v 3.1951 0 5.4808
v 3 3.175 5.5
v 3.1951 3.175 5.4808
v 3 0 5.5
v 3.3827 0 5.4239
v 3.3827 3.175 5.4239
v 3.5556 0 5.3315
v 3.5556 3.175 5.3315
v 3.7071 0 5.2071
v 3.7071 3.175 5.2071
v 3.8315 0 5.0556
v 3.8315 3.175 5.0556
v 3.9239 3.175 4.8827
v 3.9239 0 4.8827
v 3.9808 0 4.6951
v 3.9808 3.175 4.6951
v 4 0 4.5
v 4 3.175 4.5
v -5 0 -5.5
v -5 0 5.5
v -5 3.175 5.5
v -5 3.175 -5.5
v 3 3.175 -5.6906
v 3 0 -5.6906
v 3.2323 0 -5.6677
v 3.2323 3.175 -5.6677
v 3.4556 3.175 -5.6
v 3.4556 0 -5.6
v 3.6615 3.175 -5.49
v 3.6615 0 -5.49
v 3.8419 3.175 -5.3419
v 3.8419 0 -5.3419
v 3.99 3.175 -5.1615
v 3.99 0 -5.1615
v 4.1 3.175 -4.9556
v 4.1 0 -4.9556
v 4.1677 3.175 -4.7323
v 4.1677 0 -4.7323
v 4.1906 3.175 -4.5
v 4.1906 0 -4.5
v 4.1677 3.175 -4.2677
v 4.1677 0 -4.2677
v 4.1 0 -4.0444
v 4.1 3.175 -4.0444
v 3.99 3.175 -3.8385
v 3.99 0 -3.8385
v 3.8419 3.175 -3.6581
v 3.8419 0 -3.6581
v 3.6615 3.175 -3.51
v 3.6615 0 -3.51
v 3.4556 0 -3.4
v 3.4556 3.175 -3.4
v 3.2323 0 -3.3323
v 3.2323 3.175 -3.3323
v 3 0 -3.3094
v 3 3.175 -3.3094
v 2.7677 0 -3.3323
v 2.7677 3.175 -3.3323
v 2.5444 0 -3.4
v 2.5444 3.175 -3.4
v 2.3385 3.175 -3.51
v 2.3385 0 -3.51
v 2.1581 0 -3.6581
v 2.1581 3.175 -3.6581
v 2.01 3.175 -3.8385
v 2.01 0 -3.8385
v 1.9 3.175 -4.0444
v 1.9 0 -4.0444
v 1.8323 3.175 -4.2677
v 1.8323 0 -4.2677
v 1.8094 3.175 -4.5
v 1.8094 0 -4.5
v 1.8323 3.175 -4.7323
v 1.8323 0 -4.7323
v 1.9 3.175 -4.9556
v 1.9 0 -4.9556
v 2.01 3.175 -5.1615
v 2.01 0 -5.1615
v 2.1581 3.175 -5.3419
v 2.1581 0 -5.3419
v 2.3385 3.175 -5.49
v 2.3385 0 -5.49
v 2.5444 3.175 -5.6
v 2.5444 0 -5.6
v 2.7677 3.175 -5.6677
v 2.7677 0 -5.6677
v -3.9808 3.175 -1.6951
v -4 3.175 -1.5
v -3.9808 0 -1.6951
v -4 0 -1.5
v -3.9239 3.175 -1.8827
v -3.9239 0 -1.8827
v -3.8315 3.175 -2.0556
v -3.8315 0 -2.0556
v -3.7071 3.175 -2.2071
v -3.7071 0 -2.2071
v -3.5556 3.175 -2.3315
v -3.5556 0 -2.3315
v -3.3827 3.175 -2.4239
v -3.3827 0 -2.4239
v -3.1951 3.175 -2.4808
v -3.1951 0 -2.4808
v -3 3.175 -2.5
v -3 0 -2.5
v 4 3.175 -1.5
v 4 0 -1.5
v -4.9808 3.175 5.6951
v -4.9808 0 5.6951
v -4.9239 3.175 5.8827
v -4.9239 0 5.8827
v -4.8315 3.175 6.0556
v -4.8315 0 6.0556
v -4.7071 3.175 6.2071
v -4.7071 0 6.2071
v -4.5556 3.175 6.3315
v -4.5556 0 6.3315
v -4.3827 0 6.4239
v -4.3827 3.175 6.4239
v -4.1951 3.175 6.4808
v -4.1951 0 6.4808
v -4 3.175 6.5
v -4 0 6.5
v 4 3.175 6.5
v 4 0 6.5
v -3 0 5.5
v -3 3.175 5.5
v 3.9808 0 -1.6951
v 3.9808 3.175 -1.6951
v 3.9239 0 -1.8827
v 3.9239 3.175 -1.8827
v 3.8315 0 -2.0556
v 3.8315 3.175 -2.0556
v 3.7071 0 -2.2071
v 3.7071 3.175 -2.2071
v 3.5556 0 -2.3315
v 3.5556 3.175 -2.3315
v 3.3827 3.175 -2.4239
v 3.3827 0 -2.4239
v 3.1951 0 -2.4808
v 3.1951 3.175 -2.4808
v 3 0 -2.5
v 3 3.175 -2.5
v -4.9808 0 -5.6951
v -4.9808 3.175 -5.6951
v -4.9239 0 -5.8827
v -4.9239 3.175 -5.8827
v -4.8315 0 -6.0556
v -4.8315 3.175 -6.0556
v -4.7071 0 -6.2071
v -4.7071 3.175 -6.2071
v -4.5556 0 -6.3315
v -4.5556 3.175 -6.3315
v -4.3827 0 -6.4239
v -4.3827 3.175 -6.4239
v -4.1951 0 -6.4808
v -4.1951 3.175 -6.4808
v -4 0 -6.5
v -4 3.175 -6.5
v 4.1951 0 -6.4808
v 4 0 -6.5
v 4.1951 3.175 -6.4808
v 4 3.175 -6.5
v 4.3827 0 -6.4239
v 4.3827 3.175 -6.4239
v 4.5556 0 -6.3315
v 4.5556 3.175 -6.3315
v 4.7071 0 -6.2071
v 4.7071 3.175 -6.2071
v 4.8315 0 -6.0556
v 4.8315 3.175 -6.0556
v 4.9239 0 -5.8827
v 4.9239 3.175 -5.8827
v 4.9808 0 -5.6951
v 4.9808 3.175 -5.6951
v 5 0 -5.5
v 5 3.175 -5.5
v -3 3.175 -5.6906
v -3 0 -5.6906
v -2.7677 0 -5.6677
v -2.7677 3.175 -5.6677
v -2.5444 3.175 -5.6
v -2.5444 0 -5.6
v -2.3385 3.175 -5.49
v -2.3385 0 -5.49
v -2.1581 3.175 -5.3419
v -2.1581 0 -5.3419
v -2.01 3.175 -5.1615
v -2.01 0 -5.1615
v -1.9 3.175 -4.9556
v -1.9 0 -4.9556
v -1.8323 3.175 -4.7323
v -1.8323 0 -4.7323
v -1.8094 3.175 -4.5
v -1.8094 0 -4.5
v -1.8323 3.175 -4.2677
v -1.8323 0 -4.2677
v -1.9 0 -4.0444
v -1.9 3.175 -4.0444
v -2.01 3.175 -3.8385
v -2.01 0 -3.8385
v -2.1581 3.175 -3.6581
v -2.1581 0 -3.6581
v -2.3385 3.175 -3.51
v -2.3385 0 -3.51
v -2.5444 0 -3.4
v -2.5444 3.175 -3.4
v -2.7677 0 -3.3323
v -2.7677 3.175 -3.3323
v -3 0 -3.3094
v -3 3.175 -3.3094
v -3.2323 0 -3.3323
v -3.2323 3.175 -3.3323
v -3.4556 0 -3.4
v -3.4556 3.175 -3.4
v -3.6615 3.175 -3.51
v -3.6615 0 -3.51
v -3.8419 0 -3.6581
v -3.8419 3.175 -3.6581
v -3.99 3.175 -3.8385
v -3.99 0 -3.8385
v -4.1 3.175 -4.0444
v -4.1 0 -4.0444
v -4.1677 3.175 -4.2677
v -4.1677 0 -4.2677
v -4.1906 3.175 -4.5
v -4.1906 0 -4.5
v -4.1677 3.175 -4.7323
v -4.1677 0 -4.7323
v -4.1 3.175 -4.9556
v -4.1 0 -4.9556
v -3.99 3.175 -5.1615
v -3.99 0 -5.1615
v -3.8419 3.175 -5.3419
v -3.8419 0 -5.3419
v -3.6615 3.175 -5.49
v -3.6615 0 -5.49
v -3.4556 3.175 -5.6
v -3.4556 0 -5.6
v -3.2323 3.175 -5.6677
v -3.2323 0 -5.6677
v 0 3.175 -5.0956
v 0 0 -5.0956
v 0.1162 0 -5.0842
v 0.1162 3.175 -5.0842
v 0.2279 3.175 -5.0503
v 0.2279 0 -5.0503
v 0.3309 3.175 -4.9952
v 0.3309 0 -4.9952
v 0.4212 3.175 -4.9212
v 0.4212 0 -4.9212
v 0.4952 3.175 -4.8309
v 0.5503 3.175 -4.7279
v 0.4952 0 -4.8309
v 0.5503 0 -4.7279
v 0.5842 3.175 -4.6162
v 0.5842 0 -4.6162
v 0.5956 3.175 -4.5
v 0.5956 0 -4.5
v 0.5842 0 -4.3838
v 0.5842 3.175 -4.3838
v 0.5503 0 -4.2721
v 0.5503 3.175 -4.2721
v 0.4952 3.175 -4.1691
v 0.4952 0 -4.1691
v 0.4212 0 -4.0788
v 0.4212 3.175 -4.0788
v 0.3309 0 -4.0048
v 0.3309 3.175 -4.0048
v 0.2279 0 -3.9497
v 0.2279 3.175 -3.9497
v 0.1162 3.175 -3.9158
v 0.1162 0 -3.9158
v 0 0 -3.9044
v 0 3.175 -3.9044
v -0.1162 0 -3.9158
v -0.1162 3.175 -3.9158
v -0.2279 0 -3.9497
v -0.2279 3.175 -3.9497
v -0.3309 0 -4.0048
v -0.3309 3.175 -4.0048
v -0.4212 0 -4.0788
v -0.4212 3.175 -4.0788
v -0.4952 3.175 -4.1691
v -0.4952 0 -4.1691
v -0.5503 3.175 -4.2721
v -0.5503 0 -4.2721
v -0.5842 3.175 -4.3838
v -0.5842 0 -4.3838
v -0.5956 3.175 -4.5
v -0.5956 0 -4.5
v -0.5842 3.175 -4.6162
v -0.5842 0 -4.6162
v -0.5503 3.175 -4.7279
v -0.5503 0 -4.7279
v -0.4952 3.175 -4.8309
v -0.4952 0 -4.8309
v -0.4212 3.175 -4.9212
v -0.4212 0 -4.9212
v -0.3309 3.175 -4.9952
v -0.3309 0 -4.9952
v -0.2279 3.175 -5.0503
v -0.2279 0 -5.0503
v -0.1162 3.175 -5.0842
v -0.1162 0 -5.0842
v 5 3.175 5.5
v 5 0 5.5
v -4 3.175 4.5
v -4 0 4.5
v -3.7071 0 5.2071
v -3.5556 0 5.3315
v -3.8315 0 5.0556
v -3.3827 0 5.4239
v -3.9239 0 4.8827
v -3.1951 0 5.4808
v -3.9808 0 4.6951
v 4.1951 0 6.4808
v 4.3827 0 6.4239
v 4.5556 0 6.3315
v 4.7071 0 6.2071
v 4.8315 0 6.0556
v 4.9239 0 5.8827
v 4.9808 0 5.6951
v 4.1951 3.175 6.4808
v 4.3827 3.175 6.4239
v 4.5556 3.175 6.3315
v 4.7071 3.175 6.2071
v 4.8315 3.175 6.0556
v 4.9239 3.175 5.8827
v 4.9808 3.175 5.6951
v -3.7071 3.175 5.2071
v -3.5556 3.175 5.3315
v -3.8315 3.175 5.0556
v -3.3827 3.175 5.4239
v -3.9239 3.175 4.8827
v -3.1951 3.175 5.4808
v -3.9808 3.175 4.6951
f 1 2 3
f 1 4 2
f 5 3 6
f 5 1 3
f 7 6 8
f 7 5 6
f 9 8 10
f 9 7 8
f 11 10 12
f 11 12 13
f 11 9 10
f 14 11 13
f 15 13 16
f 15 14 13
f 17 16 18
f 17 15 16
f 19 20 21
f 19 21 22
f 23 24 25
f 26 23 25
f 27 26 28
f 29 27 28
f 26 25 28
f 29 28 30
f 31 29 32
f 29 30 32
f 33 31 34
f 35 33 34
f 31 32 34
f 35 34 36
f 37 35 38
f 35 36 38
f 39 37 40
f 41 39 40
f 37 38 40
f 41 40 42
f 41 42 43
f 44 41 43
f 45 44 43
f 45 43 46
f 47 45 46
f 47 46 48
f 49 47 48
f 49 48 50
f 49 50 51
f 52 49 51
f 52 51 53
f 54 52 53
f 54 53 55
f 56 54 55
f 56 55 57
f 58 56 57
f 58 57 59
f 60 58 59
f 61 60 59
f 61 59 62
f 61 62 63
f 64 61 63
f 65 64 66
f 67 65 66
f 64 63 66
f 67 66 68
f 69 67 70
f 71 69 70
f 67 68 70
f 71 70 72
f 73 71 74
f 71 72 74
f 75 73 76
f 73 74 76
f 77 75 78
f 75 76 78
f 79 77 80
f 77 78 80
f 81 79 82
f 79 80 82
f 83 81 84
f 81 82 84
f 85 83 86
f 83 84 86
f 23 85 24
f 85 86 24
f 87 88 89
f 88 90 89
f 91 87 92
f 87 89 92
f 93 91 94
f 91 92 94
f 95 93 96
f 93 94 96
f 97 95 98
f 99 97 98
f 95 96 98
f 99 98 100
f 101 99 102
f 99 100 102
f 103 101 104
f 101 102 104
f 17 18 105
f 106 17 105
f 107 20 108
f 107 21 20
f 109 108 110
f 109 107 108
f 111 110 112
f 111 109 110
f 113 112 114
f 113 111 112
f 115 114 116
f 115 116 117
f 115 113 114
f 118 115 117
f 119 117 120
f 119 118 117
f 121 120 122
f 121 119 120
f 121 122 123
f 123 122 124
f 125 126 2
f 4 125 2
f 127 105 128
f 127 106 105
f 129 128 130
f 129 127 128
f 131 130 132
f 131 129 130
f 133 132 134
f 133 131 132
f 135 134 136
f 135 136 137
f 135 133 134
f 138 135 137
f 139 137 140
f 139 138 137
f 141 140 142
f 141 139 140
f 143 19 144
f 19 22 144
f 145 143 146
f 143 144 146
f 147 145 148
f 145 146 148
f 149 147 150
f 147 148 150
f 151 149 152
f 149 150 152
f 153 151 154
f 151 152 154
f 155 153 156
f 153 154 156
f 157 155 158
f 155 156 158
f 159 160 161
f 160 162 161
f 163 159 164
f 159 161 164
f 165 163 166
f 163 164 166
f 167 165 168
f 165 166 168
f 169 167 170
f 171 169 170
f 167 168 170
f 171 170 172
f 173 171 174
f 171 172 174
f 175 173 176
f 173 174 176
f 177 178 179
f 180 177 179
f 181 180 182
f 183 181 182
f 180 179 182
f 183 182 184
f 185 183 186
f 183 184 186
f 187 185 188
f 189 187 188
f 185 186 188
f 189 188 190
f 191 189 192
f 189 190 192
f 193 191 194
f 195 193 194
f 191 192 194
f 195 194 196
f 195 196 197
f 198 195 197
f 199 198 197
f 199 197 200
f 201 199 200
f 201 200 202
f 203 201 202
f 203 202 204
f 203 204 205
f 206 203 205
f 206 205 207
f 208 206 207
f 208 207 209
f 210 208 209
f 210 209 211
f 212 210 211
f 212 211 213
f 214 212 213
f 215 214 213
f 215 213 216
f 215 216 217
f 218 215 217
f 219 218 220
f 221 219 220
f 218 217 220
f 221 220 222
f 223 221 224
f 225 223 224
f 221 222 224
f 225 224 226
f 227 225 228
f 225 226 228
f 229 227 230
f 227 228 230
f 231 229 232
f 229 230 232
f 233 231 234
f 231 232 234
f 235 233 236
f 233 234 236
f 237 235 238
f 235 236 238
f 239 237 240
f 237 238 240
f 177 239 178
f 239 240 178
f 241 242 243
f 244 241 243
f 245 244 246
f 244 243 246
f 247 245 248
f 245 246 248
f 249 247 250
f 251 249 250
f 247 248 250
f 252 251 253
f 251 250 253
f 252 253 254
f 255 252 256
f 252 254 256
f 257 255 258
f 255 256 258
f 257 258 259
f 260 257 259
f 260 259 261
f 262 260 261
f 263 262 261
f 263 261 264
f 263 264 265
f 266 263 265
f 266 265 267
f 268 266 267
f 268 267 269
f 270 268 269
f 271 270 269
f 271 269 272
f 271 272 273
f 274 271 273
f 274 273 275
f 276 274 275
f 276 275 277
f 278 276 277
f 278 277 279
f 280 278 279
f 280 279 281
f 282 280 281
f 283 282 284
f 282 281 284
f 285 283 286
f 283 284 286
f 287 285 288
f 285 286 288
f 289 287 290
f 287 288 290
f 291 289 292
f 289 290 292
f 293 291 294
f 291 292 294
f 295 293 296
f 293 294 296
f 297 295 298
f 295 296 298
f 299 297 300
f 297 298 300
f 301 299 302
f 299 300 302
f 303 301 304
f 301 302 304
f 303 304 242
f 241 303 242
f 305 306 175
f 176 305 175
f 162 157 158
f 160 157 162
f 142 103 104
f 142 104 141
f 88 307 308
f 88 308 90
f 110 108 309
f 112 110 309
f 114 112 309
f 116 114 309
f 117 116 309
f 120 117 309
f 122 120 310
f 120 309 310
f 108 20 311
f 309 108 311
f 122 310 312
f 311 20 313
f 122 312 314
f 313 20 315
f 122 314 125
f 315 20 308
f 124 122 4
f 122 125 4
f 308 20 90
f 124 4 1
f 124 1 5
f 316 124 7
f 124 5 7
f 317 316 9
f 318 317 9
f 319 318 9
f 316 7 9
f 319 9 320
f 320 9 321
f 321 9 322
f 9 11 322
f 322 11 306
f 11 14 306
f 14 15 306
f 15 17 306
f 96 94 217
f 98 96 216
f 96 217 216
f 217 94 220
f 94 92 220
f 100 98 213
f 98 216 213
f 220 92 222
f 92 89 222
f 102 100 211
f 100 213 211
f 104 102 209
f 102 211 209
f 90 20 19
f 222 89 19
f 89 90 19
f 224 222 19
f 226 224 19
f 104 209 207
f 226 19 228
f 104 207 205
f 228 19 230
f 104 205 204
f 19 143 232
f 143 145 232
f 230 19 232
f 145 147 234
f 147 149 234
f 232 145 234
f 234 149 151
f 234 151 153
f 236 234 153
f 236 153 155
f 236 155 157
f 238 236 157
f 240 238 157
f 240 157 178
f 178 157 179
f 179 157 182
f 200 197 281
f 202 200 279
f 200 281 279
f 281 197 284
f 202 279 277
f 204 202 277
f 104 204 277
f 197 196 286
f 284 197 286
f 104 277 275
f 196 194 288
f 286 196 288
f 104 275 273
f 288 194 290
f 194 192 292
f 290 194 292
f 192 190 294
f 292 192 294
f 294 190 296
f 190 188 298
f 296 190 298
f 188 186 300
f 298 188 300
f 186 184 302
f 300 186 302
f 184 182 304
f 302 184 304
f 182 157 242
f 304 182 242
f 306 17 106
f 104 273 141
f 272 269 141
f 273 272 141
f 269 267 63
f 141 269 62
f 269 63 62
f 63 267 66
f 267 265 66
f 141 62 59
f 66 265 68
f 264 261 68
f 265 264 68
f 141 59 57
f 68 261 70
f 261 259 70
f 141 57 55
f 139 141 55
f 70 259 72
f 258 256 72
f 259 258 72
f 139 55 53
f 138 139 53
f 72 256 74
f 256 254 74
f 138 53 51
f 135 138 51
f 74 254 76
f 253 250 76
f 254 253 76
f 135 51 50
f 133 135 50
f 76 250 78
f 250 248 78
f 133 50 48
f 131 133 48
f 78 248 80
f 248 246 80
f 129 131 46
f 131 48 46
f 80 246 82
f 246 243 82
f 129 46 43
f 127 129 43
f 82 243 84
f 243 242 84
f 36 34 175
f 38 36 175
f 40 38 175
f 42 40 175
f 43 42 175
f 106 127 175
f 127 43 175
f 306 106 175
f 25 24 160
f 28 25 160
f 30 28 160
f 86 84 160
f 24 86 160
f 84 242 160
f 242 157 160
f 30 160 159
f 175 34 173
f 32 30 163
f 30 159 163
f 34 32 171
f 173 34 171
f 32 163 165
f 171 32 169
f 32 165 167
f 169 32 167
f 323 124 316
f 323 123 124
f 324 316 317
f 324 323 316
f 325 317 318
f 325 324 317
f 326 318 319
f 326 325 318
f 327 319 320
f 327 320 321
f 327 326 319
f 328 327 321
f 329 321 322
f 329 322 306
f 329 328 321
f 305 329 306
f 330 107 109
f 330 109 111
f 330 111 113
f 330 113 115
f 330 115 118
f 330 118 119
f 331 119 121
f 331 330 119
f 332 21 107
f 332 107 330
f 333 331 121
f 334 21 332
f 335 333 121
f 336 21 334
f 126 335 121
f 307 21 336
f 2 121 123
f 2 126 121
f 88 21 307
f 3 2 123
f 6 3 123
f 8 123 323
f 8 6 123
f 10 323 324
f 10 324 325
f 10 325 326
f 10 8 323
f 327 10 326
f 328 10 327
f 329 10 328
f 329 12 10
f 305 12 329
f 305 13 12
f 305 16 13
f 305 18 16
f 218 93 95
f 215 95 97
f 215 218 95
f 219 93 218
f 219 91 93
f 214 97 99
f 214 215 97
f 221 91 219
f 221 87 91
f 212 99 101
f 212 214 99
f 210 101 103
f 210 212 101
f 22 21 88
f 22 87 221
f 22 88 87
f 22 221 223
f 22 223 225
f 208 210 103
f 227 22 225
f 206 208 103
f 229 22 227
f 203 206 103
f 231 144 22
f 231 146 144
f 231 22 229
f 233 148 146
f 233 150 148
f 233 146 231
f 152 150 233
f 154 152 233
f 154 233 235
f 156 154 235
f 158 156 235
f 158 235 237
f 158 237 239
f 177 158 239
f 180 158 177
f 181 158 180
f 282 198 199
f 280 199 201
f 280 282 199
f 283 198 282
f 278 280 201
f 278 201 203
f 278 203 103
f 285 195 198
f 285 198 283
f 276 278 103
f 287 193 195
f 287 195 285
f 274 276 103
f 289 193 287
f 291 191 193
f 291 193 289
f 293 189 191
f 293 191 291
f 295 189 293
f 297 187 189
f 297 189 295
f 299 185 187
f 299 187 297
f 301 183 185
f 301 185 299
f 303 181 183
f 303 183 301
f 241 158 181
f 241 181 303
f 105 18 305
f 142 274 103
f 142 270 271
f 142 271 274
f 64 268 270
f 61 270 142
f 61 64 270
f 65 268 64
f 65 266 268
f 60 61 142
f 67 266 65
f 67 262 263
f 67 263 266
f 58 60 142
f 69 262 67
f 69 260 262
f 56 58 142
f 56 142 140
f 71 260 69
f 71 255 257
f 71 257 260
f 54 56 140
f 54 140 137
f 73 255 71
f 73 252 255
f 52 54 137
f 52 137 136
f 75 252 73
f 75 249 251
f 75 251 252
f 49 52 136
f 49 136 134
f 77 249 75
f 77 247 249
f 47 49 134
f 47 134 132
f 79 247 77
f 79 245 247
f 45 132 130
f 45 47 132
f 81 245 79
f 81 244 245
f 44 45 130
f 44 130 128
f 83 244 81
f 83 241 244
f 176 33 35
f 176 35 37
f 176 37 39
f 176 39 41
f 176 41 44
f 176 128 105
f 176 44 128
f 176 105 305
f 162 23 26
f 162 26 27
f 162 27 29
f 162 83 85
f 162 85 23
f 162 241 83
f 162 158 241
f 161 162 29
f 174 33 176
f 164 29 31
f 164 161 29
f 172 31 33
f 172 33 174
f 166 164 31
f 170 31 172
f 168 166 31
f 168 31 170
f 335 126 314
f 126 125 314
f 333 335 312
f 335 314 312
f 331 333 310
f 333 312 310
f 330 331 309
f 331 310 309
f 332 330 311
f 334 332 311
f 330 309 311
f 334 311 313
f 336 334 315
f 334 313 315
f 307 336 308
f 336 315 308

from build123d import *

# Parameters (mm, degrees)
SKETCH1_W                           = 10
SKETCH1_H                           = 13
EXTRUDE1_DEPTH                      = 3.175
SKETCH2_W                           = 8
SKETCH2_H                           = 8
EXTRUDE2_DEPTH                      = 3.5
F_0_80_TAPPED_HOLE1_D               = 1.19126
F_0_80_TAPPED_HOLE1_DEPTH           = 4
F_0_80_TAPPED_HOLE1_TIP             = 0.357890611
F_3_32_0_09375_DIAMETER_HOLE1_D     = 2.38125
F_3_32_0_09375_DIAMETER_HOLE1_DEPTH = 10
F_3_32_0_09375_DIAMETER_HOLE1_TIP   = 0.715399675
FILLET7_R                           = 1


with BuildPart() as part:
    # Sketch1 → Extrude1 (new body)
    with BuildSketch(Plane(origin=(0, 0, 0), x_dir=(1, 0, 0), z_dir=(0, 1, 0))):
        Rectangle(SKETCH1_W, SKETCH1_H)
    extrude(amount=EXTRUDE1_DEPTH)

    # Sketch2 → Extrude2 (cut)
    with BuildSketch(Plane(origin=(0, 3.175, 0), x_dir=(1, 0, 0), z_dir=(0, 1, 0))):
        with Locations((0, -1.5)):
            Rectangle(SKETCH2_W, SKETCH2_H)
    extrude(amount=-EXTRUDE2_DEPTH, mode=Mode.SUBTRACT)

    # #0-80 Tapped Hole1
    with Locations(Plane(origin=(0, 3.175, -4.5), x_dir=(0, 0, 1), z_dir=(0, 1, 0))):
        with Locations((0, 0)):
            Hole(F_0_80_TAPPED_HOLE1_D / 2, depth=F_0_80_TAPPED_HOLE1_DEPTH)
            with Locations((0, 0, -(F_0_80_TAPPED_HOLE1_DEPTH + F_0_80_TAPPED_HOLE1_TIP / 2))):  # 118° drill point
                Cone(0, F_0_80_TAPPED_HOLE1_D / 2, F_0_80_TAPPED_HOLE1_TIP, mode=Mode.SUBTRACT)

    # 3/32 (0.09375) Diameter Hole1
    with Locations(Plane(origin=(-3, 3.175, -4.5), x_dir=(0, 0, 1), z_dir=(0, 1, 0))):
        with Locations((0, 0), (0, 6)):
            Hole(F_3_32_0_09375_DIAMETER_HOLE1_D / 2, depth=F_3_32_0_09375_DIAMETER_HOLE1_DEPTH)
            with Locations((0, 0, -(F_3_32_0_09375_DIAMETER_HOLE1_DEPTH + F_3_32_0_09375_DIAMETER_HOLE1_TIP / 2))):  # 118° drill point
                Cone(0, F_3_32_0_09375_DIAMETER_HOLE1_D / 2, F_3_32_0_09375_DIAMETER_HOLE1_TIP, mode=Mode.SUBTRACT)

    # Fillet7
    fillet7_edges = [part.edges().sort_by_distance(p)[0] for p in [
        (-4, 1.5875, 5.5),
        (-4, 1.5875, -2.5),
        (4, 1.5875, -2.5),
        (4, 1.5875, 5.5),
        (-5, 1.5875, -6.5),
        (5, 1.5875, -6.5),
        (5, 1.5875, 6.5),
        (-5, 1.5875, 6.5),
    ]]
    fillet(fillet7_edges, radius=FILLET7_R)


solid = part.part
